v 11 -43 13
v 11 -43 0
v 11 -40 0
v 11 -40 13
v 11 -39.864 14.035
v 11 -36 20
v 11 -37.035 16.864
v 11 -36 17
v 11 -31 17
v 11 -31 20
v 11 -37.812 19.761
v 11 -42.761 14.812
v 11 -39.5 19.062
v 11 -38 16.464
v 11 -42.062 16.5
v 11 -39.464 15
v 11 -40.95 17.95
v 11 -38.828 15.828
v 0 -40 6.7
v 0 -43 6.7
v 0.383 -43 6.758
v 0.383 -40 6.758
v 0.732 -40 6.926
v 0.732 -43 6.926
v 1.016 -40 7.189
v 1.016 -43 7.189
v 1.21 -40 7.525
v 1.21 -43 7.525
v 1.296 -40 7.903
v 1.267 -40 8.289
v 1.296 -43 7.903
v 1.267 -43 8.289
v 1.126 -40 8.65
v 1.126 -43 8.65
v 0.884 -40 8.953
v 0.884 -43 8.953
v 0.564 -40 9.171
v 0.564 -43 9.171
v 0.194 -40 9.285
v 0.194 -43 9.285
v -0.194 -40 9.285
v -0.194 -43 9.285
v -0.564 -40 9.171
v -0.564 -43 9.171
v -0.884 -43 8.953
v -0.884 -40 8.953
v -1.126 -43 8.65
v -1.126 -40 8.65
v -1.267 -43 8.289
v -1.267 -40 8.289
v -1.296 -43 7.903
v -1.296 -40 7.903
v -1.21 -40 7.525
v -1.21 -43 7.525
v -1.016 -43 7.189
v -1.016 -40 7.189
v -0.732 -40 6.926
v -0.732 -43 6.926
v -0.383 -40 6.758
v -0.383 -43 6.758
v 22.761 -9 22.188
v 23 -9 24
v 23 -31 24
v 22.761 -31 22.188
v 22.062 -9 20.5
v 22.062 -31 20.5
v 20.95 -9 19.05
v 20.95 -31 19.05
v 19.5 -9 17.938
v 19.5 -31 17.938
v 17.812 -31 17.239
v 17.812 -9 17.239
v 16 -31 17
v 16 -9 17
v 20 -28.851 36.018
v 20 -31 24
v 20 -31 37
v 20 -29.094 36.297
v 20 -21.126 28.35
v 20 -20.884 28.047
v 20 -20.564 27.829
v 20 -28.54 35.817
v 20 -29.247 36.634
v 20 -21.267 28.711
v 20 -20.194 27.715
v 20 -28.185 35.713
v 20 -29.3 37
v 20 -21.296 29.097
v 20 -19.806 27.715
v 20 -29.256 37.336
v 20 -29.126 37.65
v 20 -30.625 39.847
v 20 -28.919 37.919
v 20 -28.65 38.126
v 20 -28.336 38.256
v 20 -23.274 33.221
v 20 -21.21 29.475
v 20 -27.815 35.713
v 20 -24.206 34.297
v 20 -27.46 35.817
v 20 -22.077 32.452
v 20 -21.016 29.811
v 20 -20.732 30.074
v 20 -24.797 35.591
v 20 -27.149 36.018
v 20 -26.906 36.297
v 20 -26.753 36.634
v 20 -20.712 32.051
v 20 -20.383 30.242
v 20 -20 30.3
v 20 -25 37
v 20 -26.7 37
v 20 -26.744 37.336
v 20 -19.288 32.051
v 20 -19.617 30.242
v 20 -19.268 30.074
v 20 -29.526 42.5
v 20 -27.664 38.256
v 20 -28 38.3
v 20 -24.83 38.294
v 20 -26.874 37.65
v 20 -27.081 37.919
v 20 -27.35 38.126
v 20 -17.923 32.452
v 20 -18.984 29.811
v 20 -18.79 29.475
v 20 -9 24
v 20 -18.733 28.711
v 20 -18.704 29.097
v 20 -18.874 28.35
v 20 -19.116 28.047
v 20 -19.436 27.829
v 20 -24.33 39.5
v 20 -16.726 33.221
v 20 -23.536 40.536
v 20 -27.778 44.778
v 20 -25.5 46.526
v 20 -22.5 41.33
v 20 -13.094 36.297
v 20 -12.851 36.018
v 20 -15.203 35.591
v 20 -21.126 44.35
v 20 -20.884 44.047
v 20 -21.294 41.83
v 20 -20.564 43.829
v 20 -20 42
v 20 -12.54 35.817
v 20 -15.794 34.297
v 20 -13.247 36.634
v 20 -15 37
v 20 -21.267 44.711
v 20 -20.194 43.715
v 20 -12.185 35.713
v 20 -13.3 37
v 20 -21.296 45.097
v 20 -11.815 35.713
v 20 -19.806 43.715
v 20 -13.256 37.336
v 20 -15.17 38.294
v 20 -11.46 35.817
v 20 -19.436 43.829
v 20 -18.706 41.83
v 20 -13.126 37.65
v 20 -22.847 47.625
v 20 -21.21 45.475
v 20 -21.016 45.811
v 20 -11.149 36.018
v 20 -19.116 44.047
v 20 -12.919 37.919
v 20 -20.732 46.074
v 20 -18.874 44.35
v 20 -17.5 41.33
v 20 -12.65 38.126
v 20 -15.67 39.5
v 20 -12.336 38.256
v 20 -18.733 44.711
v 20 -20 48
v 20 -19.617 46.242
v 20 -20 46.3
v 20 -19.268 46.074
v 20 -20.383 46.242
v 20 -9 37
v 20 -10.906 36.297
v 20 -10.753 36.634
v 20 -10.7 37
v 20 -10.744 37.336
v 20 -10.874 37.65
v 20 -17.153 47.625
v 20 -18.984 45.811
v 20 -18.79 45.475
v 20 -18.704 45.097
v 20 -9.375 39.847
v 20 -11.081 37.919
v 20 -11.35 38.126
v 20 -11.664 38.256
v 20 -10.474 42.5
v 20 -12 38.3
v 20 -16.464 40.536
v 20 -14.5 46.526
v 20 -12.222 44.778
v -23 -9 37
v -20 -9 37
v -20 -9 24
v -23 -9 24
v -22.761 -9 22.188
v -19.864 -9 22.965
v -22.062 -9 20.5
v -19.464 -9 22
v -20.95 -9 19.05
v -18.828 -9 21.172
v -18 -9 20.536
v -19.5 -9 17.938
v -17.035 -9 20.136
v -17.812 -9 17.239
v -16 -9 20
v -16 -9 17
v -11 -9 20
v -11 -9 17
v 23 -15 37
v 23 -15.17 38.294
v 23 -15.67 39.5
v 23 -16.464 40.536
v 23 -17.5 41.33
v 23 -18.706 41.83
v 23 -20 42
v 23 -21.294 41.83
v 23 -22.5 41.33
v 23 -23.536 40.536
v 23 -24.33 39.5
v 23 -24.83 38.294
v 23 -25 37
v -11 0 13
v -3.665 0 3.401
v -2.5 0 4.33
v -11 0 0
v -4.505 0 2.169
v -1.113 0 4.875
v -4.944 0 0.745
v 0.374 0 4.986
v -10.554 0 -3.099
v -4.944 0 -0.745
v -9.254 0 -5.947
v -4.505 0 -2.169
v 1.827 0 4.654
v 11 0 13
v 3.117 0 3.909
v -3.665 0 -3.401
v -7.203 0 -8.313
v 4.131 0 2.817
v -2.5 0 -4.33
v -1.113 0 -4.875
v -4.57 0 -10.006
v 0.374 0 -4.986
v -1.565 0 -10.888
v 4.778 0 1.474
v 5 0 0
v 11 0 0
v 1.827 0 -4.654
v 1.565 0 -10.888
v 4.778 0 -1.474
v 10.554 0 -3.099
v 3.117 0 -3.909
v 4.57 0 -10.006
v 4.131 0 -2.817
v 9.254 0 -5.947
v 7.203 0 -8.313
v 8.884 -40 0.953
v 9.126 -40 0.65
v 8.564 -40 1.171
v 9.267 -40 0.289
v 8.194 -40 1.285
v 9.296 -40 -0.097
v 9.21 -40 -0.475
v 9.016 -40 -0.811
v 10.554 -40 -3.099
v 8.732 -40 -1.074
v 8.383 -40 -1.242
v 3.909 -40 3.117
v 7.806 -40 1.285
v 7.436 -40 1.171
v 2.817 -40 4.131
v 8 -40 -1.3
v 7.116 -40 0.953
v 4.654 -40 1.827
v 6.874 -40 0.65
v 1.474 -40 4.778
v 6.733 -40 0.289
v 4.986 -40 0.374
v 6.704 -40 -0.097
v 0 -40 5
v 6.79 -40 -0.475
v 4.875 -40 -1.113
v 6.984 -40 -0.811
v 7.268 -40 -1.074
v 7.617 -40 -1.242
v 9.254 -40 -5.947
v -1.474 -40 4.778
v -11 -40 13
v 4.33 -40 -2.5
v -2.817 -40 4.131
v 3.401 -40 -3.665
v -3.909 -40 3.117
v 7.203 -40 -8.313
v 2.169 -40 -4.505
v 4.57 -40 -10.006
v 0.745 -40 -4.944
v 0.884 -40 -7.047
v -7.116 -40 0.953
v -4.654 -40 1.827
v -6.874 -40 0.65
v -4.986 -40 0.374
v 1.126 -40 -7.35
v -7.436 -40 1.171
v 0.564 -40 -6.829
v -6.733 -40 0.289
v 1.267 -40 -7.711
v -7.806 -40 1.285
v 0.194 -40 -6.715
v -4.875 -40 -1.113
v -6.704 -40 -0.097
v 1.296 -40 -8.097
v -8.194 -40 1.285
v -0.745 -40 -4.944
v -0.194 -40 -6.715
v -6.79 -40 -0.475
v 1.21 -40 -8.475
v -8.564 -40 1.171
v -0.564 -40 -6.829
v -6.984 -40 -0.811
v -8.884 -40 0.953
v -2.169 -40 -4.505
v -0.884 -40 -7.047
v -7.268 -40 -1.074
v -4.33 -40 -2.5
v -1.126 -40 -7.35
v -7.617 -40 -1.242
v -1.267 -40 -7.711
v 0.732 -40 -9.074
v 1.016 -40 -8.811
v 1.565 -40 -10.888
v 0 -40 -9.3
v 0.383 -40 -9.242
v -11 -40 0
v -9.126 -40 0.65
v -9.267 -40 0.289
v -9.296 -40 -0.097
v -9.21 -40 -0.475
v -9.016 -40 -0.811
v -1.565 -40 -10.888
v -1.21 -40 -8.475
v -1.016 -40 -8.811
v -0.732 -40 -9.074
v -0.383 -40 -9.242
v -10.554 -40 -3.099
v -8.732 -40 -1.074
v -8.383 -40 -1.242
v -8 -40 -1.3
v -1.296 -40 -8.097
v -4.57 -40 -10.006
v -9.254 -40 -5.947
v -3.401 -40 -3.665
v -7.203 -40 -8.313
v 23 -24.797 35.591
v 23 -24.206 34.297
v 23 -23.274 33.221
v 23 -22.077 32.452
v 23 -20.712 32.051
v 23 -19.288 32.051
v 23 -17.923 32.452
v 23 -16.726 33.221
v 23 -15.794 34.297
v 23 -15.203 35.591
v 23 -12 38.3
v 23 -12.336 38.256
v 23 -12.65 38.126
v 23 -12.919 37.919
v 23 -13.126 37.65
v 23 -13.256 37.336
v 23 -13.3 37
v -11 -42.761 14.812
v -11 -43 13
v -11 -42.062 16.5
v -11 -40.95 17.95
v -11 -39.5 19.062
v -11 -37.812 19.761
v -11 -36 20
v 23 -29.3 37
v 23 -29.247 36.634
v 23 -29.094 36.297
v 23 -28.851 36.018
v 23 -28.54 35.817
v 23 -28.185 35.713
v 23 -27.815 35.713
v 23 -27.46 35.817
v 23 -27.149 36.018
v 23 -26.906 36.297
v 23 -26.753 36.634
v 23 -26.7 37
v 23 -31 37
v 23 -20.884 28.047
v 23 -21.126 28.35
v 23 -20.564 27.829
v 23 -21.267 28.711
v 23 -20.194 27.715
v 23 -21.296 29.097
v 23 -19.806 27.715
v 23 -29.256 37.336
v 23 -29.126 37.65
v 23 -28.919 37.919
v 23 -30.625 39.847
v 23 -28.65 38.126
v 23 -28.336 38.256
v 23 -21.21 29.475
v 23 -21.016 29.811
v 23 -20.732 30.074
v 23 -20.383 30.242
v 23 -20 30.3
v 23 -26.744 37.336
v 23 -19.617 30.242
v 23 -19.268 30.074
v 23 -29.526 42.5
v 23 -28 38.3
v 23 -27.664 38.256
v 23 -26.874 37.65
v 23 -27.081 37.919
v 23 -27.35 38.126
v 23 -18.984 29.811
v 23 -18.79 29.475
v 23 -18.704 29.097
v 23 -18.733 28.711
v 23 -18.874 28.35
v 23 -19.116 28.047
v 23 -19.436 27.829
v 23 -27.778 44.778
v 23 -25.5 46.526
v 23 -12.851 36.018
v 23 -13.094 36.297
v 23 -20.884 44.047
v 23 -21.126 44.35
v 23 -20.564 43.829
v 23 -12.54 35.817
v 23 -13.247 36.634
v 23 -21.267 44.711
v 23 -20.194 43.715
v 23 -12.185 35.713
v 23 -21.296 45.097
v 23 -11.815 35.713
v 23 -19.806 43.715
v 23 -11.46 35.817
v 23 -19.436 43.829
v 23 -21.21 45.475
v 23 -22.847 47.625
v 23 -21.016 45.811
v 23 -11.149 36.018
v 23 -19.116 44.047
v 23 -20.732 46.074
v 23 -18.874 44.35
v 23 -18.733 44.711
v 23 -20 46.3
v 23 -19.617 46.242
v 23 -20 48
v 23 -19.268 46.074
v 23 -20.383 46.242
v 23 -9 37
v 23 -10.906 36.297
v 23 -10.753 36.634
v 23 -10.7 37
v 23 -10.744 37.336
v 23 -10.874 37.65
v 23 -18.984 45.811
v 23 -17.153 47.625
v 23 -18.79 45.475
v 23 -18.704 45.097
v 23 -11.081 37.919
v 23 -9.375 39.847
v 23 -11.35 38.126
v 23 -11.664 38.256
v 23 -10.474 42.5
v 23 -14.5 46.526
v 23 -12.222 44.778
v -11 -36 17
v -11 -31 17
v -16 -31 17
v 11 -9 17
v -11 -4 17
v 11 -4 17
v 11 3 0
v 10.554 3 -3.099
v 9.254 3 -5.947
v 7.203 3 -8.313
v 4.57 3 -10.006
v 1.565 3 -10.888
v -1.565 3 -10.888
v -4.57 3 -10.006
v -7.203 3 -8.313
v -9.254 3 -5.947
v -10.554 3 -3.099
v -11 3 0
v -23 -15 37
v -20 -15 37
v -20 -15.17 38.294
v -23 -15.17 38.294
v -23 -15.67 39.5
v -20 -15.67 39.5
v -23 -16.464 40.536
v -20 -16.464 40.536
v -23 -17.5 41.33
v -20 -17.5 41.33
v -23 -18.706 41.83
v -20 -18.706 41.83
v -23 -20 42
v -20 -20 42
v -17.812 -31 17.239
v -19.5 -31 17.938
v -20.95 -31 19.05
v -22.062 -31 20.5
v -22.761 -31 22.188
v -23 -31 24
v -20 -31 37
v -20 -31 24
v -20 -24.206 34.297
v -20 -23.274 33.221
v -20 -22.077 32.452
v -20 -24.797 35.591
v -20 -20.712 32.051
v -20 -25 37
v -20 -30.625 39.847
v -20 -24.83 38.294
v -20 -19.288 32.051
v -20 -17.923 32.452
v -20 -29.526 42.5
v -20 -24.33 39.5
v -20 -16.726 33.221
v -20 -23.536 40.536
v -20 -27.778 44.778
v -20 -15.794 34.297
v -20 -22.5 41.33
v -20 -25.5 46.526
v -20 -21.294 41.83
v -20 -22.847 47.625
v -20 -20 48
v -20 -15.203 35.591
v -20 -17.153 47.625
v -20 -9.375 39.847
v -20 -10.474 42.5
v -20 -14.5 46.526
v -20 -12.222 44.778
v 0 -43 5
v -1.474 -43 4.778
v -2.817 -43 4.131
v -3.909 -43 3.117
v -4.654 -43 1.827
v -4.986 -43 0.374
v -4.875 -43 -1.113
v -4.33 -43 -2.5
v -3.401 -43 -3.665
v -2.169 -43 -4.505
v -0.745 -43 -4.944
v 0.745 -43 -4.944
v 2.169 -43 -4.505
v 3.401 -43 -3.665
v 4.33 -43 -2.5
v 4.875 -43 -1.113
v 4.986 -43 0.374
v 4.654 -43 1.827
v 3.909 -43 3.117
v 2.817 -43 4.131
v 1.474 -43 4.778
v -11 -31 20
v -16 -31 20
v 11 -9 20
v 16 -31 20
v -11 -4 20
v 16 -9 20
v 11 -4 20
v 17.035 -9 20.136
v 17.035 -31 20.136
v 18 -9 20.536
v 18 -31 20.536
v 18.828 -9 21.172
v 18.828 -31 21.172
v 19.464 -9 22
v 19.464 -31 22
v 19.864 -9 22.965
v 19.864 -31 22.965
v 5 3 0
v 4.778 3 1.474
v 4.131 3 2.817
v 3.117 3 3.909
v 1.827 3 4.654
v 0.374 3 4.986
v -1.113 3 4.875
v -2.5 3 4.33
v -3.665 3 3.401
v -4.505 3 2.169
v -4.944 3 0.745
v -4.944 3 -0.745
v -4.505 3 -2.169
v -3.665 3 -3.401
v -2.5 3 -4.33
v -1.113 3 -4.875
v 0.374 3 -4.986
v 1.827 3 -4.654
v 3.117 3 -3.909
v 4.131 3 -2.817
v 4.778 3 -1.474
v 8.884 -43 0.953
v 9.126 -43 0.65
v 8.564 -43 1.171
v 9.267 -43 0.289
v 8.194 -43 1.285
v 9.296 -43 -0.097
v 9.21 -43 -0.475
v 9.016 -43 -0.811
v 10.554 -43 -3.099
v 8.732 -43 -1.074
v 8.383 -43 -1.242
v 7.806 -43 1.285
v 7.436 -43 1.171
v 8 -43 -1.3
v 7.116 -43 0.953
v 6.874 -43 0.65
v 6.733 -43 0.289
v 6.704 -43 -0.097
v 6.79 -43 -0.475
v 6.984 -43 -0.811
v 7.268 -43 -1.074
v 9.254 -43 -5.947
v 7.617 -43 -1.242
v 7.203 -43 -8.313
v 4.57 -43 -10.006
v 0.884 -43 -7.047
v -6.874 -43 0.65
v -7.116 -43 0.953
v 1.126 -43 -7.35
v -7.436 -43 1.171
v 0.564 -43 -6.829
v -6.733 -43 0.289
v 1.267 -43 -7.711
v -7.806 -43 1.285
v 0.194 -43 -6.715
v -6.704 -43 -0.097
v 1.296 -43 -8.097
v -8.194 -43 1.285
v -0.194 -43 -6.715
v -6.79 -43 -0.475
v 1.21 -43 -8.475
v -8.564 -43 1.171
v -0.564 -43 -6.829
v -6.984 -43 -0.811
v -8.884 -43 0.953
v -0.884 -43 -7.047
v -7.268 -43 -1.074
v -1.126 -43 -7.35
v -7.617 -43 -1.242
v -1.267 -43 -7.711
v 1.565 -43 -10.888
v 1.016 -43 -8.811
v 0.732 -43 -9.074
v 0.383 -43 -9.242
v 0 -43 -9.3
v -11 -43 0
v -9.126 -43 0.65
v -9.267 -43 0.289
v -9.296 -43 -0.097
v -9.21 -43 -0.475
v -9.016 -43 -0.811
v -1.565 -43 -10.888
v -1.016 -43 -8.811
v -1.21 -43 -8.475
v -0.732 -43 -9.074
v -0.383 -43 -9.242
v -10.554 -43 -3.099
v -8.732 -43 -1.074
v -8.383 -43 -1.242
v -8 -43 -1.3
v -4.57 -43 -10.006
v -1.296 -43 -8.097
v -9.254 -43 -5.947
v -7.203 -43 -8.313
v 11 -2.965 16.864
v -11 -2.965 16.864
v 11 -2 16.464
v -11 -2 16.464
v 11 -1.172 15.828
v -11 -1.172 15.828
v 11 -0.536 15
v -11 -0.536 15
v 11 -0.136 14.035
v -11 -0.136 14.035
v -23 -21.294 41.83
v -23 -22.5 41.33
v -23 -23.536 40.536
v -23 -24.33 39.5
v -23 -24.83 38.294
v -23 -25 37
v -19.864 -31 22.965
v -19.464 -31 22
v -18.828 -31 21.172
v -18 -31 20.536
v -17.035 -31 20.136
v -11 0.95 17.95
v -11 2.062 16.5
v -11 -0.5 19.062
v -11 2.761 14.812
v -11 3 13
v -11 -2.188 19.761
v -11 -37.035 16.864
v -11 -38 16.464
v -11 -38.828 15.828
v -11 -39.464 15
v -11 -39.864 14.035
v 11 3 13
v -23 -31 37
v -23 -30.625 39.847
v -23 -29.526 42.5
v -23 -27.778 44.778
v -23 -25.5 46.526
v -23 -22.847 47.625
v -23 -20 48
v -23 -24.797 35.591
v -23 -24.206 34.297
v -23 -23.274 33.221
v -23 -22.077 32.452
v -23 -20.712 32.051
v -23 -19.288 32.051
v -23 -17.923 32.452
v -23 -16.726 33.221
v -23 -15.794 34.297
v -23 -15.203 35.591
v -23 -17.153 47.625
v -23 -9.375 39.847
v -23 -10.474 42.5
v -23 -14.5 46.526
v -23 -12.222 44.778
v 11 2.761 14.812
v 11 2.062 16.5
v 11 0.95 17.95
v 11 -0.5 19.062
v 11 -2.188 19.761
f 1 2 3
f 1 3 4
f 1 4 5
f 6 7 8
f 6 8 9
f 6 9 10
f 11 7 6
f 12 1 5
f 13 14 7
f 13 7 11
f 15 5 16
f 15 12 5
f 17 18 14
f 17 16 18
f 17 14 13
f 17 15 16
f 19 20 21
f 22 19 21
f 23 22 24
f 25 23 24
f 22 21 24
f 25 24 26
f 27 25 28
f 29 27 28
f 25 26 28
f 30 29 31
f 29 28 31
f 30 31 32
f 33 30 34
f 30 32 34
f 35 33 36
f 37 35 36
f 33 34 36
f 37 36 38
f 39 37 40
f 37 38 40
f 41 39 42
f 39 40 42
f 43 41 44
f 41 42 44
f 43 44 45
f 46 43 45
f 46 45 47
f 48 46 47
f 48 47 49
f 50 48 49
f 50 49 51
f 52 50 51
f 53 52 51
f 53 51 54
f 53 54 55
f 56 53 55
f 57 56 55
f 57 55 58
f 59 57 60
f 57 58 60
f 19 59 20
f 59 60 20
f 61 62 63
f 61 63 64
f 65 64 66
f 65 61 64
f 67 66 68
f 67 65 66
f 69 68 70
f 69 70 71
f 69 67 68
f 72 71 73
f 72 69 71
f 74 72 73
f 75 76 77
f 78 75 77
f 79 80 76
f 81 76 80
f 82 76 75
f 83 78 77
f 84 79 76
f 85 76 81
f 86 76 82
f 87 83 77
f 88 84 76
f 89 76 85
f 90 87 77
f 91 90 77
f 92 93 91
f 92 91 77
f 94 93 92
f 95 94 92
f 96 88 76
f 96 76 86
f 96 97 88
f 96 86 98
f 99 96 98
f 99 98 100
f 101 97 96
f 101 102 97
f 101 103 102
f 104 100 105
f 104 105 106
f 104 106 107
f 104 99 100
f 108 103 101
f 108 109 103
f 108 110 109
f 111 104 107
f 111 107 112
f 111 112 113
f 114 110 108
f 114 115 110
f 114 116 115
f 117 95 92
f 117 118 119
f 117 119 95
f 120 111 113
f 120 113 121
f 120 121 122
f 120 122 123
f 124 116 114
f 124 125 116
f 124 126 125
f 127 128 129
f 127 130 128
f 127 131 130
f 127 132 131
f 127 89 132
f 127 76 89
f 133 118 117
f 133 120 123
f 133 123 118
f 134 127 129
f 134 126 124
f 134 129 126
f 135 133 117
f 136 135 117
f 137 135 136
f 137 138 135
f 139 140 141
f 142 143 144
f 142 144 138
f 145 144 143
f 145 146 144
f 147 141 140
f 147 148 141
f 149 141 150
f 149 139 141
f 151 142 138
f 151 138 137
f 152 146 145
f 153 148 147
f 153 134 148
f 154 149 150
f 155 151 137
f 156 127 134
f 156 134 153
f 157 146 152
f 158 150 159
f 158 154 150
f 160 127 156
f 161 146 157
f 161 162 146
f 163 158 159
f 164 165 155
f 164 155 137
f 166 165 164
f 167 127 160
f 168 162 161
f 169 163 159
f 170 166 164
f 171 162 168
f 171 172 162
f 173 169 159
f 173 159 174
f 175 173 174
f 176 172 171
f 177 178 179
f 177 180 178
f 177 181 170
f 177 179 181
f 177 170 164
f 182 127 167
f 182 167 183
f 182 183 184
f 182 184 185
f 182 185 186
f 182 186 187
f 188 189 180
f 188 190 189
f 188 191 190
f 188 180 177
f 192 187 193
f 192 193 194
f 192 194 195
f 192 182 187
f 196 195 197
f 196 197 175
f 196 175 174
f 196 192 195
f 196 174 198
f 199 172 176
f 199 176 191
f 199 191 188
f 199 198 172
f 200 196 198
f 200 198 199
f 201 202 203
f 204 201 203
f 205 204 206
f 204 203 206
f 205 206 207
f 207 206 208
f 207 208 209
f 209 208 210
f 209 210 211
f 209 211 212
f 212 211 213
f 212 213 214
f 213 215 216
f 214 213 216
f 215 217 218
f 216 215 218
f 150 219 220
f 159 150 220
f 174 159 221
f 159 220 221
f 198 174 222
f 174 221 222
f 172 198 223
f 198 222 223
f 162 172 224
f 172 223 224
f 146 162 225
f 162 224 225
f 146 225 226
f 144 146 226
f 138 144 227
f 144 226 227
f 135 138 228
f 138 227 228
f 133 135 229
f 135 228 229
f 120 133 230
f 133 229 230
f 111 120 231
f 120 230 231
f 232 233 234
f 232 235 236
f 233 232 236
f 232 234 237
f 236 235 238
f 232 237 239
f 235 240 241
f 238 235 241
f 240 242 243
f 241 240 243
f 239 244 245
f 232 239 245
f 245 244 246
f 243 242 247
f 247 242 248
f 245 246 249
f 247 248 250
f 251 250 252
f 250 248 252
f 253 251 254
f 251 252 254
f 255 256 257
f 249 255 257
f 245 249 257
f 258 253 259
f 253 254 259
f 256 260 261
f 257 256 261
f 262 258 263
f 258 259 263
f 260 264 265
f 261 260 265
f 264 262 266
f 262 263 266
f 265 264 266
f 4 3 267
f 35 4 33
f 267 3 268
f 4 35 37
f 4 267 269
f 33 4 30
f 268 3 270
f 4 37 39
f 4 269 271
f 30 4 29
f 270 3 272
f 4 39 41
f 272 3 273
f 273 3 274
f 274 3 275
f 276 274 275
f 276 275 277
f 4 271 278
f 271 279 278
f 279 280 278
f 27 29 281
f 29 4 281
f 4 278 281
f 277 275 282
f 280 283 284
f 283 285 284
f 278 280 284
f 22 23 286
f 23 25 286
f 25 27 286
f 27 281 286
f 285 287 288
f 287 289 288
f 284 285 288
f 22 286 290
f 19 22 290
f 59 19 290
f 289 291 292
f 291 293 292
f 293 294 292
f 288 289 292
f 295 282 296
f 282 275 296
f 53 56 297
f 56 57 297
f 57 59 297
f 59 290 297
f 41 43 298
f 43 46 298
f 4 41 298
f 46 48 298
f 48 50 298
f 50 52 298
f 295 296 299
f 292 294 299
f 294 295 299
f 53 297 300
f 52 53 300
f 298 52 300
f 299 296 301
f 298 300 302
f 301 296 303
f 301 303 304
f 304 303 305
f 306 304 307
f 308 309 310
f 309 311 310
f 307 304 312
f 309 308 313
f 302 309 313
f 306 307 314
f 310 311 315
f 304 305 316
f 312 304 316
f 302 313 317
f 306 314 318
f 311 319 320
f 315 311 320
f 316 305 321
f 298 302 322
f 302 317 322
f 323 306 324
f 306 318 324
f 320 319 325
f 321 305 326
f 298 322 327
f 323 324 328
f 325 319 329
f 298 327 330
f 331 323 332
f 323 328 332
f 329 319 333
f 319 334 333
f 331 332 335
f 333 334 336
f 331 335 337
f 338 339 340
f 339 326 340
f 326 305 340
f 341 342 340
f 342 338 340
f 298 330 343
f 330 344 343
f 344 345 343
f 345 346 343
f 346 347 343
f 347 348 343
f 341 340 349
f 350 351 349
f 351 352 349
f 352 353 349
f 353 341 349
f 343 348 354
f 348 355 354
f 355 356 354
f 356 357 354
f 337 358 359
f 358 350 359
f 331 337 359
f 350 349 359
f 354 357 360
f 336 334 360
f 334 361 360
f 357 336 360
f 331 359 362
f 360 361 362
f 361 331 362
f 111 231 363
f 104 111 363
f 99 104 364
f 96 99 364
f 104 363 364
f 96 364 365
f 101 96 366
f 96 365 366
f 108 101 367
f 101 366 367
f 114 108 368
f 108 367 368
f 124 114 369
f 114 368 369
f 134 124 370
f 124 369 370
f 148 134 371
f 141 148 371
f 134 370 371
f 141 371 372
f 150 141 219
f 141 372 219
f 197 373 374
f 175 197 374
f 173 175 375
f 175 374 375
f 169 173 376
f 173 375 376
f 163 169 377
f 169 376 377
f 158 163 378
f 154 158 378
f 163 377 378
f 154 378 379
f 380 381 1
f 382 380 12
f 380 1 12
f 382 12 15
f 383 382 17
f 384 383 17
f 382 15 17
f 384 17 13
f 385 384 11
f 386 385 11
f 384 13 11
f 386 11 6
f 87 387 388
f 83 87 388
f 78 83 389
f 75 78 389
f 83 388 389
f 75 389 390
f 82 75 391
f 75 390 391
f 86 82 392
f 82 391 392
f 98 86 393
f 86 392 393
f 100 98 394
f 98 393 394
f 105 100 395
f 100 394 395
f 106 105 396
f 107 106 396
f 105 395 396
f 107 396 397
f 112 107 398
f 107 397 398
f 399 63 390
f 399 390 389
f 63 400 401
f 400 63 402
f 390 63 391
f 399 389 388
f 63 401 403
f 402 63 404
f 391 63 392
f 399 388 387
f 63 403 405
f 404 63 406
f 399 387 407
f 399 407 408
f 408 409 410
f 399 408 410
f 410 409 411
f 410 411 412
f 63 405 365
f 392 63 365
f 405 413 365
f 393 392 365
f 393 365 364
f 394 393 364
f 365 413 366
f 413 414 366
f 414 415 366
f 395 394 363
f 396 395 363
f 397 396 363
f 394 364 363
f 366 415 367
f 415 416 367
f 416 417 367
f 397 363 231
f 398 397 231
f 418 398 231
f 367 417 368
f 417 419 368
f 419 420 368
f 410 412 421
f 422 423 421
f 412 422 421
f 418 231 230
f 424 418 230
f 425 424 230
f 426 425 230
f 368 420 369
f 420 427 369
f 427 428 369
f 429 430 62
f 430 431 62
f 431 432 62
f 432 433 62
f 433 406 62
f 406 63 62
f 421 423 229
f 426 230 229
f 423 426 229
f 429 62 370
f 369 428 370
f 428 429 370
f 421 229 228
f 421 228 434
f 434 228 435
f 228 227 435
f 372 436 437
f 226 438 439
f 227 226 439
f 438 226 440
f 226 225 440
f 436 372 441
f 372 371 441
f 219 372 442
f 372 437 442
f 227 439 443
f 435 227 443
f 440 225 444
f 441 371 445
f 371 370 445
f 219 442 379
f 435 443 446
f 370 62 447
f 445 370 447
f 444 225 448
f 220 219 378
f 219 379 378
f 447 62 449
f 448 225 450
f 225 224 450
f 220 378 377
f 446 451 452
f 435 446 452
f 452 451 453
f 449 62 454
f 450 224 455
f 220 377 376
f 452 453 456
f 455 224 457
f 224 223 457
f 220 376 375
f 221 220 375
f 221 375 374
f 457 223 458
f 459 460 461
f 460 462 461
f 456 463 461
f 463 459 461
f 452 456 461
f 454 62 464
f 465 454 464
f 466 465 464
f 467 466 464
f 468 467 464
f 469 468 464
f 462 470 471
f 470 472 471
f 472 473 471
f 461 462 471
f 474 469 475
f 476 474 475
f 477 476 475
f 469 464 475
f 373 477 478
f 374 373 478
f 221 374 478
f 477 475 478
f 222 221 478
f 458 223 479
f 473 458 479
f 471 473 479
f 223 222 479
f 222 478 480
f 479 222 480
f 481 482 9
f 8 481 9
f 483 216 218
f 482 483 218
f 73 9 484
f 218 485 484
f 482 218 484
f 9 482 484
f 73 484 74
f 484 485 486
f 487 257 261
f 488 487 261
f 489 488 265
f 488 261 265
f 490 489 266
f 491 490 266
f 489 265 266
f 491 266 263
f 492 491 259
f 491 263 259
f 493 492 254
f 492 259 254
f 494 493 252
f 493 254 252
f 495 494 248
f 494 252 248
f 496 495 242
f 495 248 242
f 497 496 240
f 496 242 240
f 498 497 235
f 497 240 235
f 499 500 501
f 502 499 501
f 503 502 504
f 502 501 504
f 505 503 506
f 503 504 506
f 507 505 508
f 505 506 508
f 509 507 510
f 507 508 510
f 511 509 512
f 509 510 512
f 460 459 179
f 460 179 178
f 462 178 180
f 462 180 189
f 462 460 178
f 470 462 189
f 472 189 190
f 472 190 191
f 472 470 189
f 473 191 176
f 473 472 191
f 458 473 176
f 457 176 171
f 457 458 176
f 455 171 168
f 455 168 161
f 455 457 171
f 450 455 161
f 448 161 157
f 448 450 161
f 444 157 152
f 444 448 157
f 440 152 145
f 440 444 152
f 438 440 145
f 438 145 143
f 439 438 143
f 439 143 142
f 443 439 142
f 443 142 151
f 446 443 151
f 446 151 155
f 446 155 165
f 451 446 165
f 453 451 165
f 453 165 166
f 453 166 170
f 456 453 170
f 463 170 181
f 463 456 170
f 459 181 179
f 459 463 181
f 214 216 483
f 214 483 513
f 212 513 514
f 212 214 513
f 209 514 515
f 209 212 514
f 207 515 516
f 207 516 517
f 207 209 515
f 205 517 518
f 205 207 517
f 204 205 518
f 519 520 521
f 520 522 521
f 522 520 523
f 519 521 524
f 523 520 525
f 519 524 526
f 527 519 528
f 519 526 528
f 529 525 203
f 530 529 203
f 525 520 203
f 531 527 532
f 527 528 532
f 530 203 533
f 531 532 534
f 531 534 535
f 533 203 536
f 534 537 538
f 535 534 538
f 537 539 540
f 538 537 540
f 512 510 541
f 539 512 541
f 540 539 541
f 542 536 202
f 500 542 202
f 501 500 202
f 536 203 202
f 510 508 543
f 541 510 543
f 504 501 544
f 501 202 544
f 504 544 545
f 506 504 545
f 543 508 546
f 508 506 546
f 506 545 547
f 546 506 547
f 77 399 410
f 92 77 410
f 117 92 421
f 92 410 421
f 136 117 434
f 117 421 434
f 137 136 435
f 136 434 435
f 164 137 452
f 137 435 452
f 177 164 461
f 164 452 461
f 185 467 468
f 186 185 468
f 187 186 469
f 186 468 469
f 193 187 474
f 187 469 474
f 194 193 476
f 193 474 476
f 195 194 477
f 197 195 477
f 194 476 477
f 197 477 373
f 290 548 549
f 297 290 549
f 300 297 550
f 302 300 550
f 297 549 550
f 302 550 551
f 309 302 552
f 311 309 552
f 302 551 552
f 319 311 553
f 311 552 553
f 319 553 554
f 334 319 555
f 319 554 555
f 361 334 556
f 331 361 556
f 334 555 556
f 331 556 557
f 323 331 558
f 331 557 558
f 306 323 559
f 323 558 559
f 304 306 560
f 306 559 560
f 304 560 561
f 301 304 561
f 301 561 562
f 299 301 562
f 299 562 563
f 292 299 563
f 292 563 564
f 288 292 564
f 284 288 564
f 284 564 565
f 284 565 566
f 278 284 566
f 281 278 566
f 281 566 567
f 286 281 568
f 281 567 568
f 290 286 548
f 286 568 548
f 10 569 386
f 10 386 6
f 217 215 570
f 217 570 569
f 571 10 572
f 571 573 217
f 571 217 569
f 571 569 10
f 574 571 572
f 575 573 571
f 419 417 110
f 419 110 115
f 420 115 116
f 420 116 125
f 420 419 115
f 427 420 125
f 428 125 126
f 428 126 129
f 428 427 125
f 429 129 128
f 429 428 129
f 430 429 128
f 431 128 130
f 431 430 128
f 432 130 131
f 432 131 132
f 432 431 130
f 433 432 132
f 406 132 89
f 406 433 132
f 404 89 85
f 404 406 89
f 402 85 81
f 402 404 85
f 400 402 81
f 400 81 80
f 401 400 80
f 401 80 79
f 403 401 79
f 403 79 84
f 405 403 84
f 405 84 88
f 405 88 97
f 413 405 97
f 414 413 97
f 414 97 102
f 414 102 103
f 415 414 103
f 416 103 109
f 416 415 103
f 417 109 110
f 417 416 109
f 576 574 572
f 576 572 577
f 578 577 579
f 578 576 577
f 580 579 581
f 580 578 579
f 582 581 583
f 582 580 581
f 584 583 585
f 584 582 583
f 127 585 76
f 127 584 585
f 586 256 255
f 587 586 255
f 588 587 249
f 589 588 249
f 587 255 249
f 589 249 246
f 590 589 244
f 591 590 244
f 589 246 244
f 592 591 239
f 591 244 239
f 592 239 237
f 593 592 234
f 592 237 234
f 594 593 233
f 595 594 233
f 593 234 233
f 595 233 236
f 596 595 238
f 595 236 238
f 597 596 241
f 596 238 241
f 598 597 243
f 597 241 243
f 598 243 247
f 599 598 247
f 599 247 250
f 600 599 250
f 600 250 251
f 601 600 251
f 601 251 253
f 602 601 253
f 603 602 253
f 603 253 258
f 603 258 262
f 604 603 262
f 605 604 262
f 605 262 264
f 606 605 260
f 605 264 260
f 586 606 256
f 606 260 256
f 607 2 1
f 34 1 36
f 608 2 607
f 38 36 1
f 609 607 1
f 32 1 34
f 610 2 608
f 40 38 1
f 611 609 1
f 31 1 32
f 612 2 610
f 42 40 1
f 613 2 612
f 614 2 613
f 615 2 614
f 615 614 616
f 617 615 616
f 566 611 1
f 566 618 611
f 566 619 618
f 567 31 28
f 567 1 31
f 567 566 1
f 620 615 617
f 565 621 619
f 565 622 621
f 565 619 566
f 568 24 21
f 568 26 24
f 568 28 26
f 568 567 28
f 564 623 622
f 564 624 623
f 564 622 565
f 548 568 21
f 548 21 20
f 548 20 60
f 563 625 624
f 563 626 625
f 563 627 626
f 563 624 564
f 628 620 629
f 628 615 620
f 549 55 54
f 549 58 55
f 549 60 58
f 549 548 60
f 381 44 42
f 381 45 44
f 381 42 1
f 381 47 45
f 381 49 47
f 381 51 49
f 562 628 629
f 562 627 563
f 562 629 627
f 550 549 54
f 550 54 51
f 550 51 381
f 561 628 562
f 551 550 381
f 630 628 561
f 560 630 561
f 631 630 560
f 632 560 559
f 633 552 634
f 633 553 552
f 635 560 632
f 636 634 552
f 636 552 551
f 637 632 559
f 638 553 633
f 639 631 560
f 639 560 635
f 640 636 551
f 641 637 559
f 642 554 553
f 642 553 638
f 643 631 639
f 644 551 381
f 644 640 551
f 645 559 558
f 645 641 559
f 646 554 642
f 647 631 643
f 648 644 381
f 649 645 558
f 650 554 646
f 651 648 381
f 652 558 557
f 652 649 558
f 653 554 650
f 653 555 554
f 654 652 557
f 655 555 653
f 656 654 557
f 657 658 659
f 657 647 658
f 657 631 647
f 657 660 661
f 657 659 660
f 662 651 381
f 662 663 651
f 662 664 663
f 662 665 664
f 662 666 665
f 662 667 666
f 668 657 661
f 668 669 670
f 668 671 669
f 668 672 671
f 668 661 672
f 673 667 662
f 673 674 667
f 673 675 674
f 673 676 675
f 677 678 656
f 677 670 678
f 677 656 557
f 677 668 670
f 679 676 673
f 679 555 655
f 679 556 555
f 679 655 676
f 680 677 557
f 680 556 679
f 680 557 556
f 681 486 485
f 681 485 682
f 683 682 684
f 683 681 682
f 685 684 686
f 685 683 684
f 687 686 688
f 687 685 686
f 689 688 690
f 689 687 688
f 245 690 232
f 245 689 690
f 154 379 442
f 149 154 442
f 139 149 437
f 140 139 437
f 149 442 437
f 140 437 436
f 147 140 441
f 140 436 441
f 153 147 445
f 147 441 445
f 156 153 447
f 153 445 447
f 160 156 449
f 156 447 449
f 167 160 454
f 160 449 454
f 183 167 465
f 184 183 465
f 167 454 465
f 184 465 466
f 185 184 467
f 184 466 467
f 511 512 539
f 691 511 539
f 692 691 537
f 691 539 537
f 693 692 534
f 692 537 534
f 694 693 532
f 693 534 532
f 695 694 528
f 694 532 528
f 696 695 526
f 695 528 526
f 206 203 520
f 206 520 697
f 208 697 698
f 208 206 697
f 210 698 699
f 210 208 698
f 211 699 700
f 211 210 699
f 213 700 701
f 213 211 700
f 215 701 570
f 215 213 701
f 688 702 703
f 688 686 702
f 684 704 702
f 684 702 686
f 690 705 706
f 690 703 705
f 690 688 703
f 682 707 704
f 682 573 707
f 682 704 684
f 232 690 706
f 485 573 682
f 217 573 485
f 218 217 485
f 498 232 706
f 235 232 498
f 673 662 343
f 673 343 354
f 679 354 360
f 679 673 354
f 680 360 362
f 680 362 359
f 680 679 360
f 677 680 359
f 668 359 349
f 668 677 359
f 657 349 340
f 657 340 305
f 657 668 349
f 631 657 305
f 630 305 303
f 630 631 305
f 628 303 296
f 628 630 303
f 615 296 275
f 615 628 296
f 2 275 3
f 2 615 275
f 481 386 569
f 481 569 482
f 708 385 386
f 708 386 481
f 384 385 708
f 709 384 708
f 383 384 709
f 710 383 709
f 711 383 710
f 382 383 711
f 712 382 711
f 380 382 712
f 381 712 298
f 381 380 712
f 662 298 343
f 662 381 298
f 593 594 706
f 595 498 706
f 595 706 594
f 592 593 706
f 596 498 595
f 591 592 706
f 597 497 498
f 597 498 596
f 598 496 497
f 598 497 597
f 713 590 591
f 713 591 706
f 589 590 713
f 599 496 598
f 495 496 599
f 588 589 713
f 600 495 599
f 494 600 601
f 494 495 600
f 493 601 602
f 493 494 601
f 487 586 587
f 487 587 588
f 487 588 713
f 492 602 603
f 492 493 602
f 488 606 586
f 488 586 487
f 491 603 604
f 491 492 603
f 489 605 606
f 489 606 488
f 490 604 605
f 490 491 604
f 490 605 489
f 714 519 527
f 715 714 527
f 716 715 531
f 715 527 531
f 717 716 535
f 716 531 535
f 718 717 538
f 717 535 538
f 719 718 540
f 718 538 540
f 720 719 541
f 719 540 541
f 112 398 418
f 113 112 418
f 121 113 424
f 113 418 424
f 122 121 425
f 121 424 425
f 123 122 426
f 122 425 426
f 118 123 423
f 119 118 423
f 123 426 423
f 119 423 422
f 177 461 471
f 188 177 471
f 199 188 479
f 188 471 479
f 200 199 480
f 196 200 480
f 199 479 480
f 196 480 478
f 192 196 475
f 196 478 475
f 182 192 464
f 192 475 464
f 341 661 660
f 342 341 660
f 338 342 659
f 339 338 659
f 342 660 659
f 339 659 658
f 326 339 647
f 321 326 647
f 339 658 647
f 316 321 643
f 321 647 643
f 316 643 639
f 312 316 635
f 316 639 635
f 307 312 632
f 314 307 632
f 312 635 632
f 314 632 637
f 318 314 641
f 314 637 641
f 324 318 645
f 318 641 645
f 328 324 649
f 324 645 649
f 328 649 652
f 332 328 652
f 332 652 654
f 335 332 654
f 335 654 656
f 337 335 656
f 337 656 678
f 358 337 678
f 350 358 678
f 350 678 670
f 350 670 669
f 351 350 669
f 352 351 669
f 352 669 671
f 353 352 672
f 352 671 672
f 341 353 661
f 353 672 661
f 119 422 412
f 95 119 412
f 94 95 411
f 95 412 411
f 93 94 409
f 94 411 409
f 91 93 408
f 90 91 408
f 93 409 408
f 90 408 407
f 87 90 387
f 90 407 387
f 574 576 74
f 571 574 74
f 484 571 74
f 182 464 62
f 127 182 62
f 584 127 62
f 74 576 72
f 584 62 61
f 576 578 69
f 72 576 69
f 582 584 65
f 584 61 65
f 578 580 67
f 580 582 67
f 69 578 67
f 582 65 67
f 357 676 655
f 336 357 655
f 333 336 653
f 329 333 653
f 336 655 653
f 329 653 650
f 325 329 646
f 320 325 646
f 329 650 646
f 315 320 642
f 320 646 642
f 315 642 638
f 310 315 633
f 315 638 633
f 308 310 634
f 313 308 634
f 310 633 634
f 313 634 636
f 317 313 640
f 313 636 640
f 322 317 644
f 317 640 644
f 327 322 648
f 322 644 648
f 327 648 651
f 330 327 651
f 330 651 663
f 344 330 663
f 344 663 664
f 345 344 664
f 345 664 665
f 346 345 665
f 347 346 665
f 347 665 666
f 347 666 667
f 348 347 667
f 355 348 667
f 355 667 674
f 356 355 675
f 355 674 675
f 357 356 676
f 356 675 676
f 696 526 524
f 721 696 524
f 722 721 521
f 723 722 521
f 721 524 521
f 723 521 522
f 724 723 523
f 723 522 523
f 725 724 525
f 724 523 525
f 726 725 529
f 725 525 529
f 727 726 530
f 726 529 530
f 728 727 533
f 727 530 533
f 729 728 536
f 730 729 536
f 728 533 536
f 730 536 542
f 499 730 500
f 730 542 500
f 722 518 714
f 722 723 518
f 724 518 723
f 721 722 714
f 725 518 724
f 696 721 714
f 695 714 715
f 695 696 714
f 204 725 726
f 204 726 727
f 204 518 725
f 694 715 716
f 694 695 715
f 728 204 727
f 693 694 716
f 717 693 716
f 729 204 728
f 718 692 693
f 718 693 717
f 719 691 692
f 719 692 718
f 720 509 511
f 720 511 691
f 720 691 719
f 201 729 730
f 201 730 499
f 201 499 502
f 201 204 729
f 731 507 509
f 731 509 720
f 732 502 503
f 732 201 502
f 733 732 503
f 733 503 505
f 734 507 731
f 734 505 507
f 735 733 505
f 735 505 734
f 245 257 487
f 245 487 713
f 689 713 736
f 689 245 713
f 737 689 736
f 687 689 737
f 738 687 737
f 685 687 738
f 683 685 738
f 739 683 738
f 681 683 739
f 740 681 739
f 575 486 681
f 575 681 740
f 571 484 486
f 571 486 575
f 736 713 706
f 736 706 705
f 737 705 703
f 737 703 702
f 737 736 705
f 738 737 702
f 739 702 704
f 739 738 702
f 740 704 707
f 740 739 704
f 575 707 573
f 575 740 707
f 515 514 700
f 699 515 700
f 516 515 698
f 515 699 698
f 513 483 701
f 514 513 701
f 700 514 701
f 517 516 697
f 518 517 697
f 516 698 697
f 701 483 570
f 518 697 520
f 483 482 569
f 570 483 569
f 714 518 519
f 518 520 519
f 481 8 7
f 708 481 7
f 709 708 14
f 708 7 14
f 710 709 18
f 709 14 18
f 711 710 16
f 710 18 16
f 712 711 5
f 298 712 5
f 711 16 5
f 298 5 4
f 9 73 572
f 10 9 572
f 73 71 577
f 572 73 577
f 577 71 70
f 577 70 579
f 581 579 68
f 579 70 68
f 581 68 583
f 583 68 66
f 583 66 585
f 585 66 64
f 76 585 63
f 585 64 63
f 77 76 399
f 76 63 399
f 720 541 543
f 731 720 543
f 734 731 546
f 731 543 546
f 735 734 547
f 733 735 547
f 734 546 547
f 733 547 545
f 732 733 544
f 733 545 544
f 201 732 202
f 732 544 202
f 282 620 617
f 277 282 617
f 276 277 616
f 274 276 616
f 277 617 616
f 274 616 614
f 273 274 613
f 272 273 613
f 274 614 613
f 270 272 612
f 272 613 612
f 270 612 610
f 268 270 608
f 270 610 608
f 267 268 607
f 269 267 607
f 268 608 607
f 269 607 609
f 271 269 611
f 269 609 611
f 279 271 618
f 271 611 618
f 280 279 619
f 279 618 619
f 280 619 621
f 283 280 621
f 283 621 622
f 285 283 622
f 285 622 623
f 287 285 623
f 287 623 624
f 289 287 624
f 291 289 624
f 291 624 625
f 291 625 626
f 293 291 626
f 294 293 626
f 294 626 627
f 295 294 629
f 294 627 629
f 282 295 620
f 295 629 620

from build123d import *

# Parameters (mm, degrees)
BOSS_EXTRUDE1_DEPTH  = 3
BOSS_EXTRUDE2_DEPTH  = 22
BOSS_EXTRUDE10_DEPTH = 22
BOSS_EXTRUDE3_START  = 3
SKETCH3_R            = 1.3
SKETCH3_R_2          = 5
BOSS_EXTRUDE3_DEPTH  = 3
SKETCH5_W            = 32
SKETCH5_H            = 22
BOSS_EXTRUDE4_DEPTH  = 3
BOSS_EXTRUDE5_DEPTH  = 22
SKETCH8_R            = 1.3
BOSS_EXTRUDE8_DEPTH  = 3
BOSS_EXTRUDE9_START  = -3
BOSS_EXTRUDE9_DEPTH  = 3


with BuildPart() as part:
    # Sketch1 → Boss-Extrude1 (new body)
    with BuildSketch(Plane(origin=(0, 0, 0), x_dir=(1, 0, 0), z_dir=(0, 1, 0))):
        with BuildLine():
            ThreePointArc((-5, 0), (0, 5), (5, 0))
            Line((5, 0), (11, 0))
            ThreePointArc((11, 0), (0, 11), (-11, 0))
            Line((-11, 0), (-5, 0))
        make_face()
        with BuildLine():
            Line((11, 0), (5, 0))
            ThreePointArc((5, 0), (0, -5), (-5, 0))
            Line((-5, 0), (-11, 0))
            ThreePointArc((-11, 0), (0, -11), (11, 0))
        make_face()
        with BuildLine():
            Line((11, -13), (11, 0))
            ThreePointArc((11, 0), (0, -11), (-11, 0))
            Line((-11, 0), (-11, -13))
            Line((-11, -13), (11, -13))
        make_face()
    extrude(amount=BOSS_EXTRUDE1_DEPTH)

    # Sketch2 → Boss-Extrude2 (add)
    with BuildSketch(Plane(origin=(11, 0, 0), x_dir=(0, 0, -1), z_dir=(1, 0, 0))):
        with BuildLine():
            Line((-13, 0), (-13, 3))
            ThreePointArc((-13, 3), (-17.949747468, 0.949747468), (-20, -4))
            Line((-20, -4), (-20, -36))
            Line((-20, -36), (-17, -36))
            Line((-17, -36), (-17, -4))
            ThreePointArc((-17, -4), (-15.828427125, -1.171572875), (-13, 0))
        make_face()
    extrude(amount=-BOSS_EXTRUDE2_DEPTH)

    # Sketch2<4> → Boss-Extrude10 (add)
    with BuildSketch(Plane(origin=(11, 0, 0), x_dir=(0, 0, -1), z_dir=(1, 0, 0))):
        with BuildLine():
            Line((-20, -36), (-17, -36))
            ThreePointArc((-17, -36), (-15.828427125, -38.828427125), (-13, -40))
            Line((-13, -40), (-13, -43))
            ThreePointArc((-13, -43), (-17.949747468, -40.949747468), (-20, -36))
        make_face()
    extrude(amount=-BOSS_EXTRUDE10_DEPTH)

    # Sketch3 → Boss-Extrude3 (add)
    with BuildSketch(Plane(origin=(0, -40, 0), x_dir=(-1, 0, 0), z_dir=(0, -1, 0)).offset(BOSS_EXTRUDE3_START)):
        with BuildLine():
            ThreePointArc((11, 0), (0, 11), (-11, 0))
            Line((-11, 0), (-11, -13))
            Line((-11, -13), (11, -13))
            Line((11, -13), (11, 0))
        make_face()
        with Locations(Location((8, 0, 0), (0, 0, 90))):
            Circle(SKETCH3_R, mode=Mode.SUBTRACT)
        with Locations(Location((0, 0, 0), (0, 0, 270))):
            Circle(SKETCH3_R_2, mode=Mode.SUBTRACT)
        with Locations(Location((-8, 0, 0), (0, 0, 90))):
            Circle(SKETCH3_R, mode=Mode.SUBTRACT)
        with Locations(Location((0, 8, 0), (0, 0, 90))):
            Circle(SKETCH3_R, mode=Mode.SUBTRACT)
        with Locations(Location((0, -8, 0), (0, 0, 90))):
            Circle(SKETCH3_R, mode=Mode.SUBTRACT)
    extrude(amount=-BOSS_EXTRUDE3_DEPTH)

    # Sketch5 → Boss-Extrude4 (add)
    with BuildSketch(Plane.XY.offset(20)):
        with Locations((0, -20)):
            Rectangle(SKETCH5_W, SKETCH5_H)
    extrude(amount=-BOSS_EXTRUDE4_DEPTH)

    # Sketch6 → Boss-Extrude5 (add)
    with BuildSketch(Plane(origin=(0, -9, 0), x_dir=(1, 0, 0), z_dir=(0, 1, 0))):
        with BuildLine():
            Line((-23, -24), (-20, -24))
            ThreePointArc((-20, -24), (-18.828427125, -21.171572875), (-16, -20))
            Line((-16, -20), (-16, -17))
            ThreePointArc((-16, -17), (-20.949747468, -19.050252532), (-23, -24))
        make_face()
        with BuildLine():
            Line((20, -24), (23, -24))
            ThreePointArc((23, -24), (20.949747468, -19.050252532), (16, -17))
            Line((16, -17), (16, -20))
            ThreePointArc((16, -20), (18.828427125, -21.171572875), (20, -24))
        make_face()
    extrude(amount=-BOSS_EXTRUDE5_DEPTH)

    # Sketch8 → Boss-Extrude8 (add)
    # profile 1 of 3: a face of its own
    with BuildSketch(Plane.ZY.offset(-23)):
        with BuildLine():
            Line((37, -9), (24, -9))
            Line((24, -9), (24, -31))
            Line((24, -31), (37, -31))
            ThreePointArc((37, -31), (26, -20), (37, -9))
        make_face()
    # profile 2 of 3: a face of its own
    with BuildSketch(Plane.ZY.offset(-23)):
        with BuildLine():
            Line((37, -10.7), (37, -9))
            ThreePointArc((37, -9), (26, -20), (37, -31))
            Line((37, -31), (37, -29.3))
            ThreePointArc((37, -29.3), (35.7, -28), (37, -26.7))
            Line((37, -26.7), (37, -25))
            ThreePointArc((37, -25), (32, -20), (37, -15))
            Line((37, -15), (37, -13.3))
            ThreePointArc((37, -13.3), (35.7, -12), (37, -10.7))
        make_face()
        with Locations((29, -20)):
            Circle(SKETCH8_R, mode=Mode.SUBTRACT)
    # profile 3 of 3: a face of its own
    with BuildSketch(Plane.ZY.offset(-23)):
        with BuildLine():
            ThreePointArc((48, -20), (44.778174593, -12.221825407), (37, -9))
            Line((37, -9), (37, -10.7))
            ThreePointArc((37, -10.7), (37.919238816, -11.080761184), (38.3, -12))
            ThreePointArc((38.3, -12), (37.919238816, -12.919238816), (37, -13.3))
            Line((37, -13.3), (37, -15))
            ThreePointArc((37, -15), (40.535533906, -16.464466094), (42, -20))
            ThreePointArc((42, -20), (40.535533906, -23.535533906), (37, -25))
            Line((37, -25), (37, -26.7))
            ThreePointArc((37, -26.7), (37.919238816, -27.080761184), (38.3, -28))
            ThreePointArc((38.3, -28), (37.919238816, -28.919238816), (37, -29.3))
            Line((37, -29.3), (37, -31))
            ThreePointArc((37, -31), (44.778174593, -27.778174593), (48, -20))
        make_face()
        with Locations((45, -20)):
            Circle(SKETCH8_R, mode=Mode.SUBTRACT)
    extrude(amount=BOSS_EXTRUDE8_DEPTH)

    # Sketch9 → Boss-Extrude9 (add)
    with BuildSketch(Plane.ZY.offset(23).offset(BOSS_EXTRUDE9_START)):
        with BuildLine():
            Line((24, -9), (24, -31))
            Line((24, -31), (37, -31))
            ThreePointArc((37, -31), (26, -20), (37, -9))
            Line((37, -9), (24, -9))
        make_face()
        with BuildLine():
            ThreePointArc((37, -9), (26, -20), (37, -31))
            Line((37, -31), (37, -25))
            ThreePointArc((37, -25), (32, -20), (37, -15))
            Line((37, -15), (37, -9))
        make_face()
        with BuildLine():
            Line((37, -25), (37, -31))
            ThreePointArc((37, -31), (44.778174593, -27.778174593), (48, -20))
            ThreePointArc((48, -20), (44.778174593, -12.221825407), (37, -9))
            Line((37, -9), (37, -15))
            ThreePointArc((37, -15), (40.535533906, -16.464466094), (42, -20))
            ThreePointArc((42, -20), (40.535533906, -23.535533906), (37, -25))
        make_face()
    extrude(amount=BOSS_EXTRUDE9_DEPTH)


solid = part.part
